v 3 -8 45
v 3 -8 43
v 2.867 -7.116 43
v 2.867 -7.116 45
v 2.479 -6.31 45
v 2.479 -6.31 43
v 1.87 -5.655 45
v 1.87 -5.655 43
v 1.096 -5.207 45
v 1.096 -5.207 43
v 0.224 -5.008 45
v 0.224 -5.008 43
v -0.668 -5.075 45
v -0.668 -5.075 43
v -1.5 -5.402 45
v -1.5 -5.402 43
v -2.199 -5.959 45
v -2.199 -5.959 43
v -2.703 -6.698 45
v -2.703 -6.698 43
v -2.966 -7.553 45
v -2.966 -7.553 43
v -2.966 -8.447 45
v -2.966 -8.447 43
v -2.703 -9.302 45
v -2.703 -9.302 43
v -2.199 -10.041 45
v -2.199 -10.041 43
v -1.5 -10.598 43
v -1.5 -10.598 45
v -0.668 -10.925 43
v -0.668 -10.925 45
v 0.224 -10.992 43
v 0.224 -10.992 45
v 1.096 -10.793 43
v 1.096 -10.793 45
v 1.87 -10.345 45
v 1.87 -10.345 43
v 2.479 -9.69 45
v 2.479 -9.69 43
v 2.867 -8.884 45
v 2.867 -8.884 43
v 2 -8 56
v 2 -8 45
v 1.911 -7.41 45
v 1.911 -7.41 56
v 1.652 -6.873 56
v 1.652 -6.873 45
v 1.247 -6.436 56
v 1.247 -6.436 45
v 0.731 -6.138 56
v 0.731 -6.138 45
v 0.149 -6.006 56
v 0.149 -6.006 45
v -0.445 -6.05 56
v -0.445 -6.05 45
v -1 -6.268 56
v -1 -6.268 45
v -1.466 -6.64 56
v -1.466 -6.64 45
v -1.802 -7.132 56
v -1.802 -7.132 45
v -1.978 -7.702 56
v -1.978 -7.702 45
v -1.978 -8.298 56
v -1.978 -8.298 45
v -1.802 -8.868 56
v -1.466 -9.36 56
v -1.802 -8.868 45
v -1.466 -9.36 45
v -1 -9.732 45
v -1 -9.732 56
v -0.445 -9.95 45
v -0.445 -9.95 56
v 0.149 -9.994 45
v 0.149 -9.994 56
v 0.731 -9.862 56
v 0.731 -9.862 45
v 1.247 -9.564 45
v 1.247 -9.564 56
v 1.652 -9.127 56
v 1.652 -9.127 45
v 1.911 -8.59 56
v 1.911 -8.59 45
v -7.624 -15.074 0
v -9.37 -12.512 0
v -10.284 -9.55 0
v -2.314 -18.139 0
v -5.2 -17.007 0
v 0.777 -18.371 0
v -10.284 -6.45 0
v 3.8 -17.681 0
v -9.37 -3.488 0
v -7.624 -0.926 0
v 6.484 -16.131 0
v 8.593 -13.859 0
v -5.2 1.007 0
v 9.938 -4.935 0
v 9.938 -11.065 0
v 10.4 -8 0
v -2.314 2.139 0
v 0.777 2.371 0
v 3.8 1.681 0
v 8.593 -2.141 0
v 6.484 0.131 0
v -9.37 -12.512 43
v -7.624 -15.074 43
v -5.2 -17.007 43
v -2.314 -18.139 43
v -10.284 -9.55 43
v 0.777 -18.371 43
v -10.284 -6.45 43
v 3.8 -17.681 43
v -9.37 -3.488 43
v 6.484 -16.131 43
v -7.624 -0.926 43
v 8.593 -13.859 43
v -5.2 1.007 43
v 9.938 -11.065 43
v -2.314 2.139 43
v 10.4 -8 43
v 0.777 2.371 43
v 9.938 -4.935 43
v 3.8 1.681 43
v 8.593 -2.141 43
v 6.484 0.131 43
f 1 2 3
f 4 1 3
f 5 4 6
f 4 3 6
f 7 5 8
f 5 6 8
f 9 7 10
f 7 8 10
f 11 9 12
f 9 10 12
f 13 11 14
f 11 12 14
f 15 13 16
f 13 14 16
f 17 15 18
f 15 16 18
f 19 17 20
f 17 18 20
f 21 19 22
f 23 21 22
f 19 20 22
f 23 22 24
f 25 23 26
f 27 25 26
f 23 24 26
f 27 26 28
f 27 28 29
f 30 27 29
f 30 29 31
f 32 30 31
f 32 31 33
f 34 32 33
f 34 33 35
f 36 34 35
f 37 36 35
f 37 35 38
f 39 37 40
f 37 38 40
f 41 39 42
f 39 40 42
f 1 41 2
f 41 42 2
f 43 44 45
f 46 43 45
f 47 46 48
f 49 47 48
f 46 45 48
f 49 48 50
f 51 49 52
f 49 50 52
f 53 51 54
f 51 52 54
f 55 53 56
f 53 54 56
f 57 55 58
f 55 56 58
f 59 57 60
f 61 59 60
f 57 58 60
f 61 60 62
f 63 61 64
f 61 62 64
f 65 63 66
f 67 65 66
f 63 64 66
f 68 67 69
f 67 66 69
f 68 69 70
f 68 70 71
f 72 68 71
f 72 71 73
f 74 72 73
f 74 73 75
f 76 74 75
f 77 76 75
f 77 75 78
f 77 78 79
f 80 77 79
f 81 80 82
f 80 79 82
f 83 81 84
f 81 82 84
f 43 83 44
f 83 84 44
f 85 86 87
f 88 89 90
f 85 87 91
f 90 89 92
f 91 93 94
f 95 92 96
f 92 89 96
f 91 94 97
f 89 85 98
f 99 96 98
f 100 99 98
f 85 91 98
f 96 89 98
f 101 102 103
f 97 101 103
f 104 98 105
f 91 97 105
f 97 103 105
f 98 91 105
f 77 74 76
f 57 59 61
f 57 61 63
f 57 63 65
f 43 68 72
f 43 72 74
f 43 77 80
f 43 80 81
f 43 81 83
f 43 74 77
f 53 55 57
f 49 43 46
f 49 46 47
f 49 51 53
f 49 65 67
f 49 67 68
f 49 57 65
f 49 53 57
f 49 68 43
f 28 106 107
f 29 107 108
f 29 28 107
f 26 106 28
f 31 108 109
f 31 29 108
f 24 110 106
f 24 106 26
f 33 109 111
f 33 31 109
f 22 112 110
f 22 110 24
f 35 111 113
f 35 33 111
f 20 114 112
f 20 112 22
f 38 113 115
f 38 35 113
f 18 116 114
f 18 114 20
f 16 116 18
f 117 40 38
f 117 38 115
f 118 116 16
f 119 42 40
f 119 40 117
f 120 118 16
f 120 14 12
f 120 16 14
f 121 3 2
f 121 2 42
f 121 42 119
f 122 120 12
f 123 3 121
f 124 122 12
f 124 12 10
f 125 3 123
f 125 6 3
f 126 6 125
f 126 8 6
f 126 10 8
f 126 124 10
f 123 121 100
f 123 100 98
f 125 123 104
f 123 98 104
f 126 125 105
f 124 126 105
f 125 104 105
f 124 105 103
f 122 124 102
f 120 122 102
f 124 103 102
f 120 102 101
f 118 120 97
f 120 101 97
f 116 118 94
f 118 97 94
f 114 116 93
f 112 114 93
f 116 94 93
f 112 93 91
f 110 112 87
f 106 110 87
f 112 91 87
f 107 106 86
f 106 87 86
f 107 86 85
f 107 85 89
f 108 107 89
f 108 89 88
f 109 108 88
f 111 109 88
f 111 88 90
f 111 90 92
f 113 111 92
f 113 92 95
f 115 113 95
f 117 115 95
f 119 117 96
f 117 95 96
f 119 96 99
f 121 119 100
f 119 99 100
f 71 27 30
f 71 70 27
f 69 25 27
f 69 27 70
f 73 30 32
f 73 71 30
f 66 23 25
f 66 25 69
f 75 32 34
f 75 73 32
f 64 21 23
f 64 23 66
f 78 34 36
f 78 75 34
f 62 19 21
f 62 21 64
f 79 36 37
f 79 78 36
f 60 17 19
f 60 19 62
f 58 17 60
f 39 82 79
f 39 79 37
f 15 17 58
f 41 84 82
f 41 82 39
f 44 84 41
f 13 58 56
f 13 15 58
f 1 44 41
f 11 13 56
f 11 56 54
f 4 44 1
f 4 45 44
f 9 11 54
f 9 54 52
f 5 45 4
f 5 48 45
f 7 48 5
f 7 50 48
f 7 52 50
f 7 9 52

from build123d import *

# Parameters (mm, degrees)
SKETCH_R     = 10.4
PAD_DEPTH    = 43
SKETCH001_R  = 3
PAD001_DEPTH = 2
SKETCH002_R  = 2
PAD002_DEPTH = 11


with BuildPart() as part:
    # Sketch → Pad (new body)
    with BuildSketch(Plane.XY):
        Circle(SKETCH_R)
    extrude(amount=PAD_DEPTH)

    # Sketch001 (on Face3 of Pad) → Pad001 (join)
    with BuildSketch(Plane.XY.offset(43)):
        Circle(SKETCH001_R)
    extrude(amount=PAD001_DEPTH)

    # Sketch002 (on Face5 of Pad001) → Pad002 (join)
    with BuildSketch(Plane.XY.offset(45)):
        Circle(SKETCH002_R)
    extrude(amount=PAD002_DEPTH)


with BuildPart() as part_1:
    # Body placement: moved
    add(part.part.moved(Location((0, -8, 0))))


solid = part_1.part
